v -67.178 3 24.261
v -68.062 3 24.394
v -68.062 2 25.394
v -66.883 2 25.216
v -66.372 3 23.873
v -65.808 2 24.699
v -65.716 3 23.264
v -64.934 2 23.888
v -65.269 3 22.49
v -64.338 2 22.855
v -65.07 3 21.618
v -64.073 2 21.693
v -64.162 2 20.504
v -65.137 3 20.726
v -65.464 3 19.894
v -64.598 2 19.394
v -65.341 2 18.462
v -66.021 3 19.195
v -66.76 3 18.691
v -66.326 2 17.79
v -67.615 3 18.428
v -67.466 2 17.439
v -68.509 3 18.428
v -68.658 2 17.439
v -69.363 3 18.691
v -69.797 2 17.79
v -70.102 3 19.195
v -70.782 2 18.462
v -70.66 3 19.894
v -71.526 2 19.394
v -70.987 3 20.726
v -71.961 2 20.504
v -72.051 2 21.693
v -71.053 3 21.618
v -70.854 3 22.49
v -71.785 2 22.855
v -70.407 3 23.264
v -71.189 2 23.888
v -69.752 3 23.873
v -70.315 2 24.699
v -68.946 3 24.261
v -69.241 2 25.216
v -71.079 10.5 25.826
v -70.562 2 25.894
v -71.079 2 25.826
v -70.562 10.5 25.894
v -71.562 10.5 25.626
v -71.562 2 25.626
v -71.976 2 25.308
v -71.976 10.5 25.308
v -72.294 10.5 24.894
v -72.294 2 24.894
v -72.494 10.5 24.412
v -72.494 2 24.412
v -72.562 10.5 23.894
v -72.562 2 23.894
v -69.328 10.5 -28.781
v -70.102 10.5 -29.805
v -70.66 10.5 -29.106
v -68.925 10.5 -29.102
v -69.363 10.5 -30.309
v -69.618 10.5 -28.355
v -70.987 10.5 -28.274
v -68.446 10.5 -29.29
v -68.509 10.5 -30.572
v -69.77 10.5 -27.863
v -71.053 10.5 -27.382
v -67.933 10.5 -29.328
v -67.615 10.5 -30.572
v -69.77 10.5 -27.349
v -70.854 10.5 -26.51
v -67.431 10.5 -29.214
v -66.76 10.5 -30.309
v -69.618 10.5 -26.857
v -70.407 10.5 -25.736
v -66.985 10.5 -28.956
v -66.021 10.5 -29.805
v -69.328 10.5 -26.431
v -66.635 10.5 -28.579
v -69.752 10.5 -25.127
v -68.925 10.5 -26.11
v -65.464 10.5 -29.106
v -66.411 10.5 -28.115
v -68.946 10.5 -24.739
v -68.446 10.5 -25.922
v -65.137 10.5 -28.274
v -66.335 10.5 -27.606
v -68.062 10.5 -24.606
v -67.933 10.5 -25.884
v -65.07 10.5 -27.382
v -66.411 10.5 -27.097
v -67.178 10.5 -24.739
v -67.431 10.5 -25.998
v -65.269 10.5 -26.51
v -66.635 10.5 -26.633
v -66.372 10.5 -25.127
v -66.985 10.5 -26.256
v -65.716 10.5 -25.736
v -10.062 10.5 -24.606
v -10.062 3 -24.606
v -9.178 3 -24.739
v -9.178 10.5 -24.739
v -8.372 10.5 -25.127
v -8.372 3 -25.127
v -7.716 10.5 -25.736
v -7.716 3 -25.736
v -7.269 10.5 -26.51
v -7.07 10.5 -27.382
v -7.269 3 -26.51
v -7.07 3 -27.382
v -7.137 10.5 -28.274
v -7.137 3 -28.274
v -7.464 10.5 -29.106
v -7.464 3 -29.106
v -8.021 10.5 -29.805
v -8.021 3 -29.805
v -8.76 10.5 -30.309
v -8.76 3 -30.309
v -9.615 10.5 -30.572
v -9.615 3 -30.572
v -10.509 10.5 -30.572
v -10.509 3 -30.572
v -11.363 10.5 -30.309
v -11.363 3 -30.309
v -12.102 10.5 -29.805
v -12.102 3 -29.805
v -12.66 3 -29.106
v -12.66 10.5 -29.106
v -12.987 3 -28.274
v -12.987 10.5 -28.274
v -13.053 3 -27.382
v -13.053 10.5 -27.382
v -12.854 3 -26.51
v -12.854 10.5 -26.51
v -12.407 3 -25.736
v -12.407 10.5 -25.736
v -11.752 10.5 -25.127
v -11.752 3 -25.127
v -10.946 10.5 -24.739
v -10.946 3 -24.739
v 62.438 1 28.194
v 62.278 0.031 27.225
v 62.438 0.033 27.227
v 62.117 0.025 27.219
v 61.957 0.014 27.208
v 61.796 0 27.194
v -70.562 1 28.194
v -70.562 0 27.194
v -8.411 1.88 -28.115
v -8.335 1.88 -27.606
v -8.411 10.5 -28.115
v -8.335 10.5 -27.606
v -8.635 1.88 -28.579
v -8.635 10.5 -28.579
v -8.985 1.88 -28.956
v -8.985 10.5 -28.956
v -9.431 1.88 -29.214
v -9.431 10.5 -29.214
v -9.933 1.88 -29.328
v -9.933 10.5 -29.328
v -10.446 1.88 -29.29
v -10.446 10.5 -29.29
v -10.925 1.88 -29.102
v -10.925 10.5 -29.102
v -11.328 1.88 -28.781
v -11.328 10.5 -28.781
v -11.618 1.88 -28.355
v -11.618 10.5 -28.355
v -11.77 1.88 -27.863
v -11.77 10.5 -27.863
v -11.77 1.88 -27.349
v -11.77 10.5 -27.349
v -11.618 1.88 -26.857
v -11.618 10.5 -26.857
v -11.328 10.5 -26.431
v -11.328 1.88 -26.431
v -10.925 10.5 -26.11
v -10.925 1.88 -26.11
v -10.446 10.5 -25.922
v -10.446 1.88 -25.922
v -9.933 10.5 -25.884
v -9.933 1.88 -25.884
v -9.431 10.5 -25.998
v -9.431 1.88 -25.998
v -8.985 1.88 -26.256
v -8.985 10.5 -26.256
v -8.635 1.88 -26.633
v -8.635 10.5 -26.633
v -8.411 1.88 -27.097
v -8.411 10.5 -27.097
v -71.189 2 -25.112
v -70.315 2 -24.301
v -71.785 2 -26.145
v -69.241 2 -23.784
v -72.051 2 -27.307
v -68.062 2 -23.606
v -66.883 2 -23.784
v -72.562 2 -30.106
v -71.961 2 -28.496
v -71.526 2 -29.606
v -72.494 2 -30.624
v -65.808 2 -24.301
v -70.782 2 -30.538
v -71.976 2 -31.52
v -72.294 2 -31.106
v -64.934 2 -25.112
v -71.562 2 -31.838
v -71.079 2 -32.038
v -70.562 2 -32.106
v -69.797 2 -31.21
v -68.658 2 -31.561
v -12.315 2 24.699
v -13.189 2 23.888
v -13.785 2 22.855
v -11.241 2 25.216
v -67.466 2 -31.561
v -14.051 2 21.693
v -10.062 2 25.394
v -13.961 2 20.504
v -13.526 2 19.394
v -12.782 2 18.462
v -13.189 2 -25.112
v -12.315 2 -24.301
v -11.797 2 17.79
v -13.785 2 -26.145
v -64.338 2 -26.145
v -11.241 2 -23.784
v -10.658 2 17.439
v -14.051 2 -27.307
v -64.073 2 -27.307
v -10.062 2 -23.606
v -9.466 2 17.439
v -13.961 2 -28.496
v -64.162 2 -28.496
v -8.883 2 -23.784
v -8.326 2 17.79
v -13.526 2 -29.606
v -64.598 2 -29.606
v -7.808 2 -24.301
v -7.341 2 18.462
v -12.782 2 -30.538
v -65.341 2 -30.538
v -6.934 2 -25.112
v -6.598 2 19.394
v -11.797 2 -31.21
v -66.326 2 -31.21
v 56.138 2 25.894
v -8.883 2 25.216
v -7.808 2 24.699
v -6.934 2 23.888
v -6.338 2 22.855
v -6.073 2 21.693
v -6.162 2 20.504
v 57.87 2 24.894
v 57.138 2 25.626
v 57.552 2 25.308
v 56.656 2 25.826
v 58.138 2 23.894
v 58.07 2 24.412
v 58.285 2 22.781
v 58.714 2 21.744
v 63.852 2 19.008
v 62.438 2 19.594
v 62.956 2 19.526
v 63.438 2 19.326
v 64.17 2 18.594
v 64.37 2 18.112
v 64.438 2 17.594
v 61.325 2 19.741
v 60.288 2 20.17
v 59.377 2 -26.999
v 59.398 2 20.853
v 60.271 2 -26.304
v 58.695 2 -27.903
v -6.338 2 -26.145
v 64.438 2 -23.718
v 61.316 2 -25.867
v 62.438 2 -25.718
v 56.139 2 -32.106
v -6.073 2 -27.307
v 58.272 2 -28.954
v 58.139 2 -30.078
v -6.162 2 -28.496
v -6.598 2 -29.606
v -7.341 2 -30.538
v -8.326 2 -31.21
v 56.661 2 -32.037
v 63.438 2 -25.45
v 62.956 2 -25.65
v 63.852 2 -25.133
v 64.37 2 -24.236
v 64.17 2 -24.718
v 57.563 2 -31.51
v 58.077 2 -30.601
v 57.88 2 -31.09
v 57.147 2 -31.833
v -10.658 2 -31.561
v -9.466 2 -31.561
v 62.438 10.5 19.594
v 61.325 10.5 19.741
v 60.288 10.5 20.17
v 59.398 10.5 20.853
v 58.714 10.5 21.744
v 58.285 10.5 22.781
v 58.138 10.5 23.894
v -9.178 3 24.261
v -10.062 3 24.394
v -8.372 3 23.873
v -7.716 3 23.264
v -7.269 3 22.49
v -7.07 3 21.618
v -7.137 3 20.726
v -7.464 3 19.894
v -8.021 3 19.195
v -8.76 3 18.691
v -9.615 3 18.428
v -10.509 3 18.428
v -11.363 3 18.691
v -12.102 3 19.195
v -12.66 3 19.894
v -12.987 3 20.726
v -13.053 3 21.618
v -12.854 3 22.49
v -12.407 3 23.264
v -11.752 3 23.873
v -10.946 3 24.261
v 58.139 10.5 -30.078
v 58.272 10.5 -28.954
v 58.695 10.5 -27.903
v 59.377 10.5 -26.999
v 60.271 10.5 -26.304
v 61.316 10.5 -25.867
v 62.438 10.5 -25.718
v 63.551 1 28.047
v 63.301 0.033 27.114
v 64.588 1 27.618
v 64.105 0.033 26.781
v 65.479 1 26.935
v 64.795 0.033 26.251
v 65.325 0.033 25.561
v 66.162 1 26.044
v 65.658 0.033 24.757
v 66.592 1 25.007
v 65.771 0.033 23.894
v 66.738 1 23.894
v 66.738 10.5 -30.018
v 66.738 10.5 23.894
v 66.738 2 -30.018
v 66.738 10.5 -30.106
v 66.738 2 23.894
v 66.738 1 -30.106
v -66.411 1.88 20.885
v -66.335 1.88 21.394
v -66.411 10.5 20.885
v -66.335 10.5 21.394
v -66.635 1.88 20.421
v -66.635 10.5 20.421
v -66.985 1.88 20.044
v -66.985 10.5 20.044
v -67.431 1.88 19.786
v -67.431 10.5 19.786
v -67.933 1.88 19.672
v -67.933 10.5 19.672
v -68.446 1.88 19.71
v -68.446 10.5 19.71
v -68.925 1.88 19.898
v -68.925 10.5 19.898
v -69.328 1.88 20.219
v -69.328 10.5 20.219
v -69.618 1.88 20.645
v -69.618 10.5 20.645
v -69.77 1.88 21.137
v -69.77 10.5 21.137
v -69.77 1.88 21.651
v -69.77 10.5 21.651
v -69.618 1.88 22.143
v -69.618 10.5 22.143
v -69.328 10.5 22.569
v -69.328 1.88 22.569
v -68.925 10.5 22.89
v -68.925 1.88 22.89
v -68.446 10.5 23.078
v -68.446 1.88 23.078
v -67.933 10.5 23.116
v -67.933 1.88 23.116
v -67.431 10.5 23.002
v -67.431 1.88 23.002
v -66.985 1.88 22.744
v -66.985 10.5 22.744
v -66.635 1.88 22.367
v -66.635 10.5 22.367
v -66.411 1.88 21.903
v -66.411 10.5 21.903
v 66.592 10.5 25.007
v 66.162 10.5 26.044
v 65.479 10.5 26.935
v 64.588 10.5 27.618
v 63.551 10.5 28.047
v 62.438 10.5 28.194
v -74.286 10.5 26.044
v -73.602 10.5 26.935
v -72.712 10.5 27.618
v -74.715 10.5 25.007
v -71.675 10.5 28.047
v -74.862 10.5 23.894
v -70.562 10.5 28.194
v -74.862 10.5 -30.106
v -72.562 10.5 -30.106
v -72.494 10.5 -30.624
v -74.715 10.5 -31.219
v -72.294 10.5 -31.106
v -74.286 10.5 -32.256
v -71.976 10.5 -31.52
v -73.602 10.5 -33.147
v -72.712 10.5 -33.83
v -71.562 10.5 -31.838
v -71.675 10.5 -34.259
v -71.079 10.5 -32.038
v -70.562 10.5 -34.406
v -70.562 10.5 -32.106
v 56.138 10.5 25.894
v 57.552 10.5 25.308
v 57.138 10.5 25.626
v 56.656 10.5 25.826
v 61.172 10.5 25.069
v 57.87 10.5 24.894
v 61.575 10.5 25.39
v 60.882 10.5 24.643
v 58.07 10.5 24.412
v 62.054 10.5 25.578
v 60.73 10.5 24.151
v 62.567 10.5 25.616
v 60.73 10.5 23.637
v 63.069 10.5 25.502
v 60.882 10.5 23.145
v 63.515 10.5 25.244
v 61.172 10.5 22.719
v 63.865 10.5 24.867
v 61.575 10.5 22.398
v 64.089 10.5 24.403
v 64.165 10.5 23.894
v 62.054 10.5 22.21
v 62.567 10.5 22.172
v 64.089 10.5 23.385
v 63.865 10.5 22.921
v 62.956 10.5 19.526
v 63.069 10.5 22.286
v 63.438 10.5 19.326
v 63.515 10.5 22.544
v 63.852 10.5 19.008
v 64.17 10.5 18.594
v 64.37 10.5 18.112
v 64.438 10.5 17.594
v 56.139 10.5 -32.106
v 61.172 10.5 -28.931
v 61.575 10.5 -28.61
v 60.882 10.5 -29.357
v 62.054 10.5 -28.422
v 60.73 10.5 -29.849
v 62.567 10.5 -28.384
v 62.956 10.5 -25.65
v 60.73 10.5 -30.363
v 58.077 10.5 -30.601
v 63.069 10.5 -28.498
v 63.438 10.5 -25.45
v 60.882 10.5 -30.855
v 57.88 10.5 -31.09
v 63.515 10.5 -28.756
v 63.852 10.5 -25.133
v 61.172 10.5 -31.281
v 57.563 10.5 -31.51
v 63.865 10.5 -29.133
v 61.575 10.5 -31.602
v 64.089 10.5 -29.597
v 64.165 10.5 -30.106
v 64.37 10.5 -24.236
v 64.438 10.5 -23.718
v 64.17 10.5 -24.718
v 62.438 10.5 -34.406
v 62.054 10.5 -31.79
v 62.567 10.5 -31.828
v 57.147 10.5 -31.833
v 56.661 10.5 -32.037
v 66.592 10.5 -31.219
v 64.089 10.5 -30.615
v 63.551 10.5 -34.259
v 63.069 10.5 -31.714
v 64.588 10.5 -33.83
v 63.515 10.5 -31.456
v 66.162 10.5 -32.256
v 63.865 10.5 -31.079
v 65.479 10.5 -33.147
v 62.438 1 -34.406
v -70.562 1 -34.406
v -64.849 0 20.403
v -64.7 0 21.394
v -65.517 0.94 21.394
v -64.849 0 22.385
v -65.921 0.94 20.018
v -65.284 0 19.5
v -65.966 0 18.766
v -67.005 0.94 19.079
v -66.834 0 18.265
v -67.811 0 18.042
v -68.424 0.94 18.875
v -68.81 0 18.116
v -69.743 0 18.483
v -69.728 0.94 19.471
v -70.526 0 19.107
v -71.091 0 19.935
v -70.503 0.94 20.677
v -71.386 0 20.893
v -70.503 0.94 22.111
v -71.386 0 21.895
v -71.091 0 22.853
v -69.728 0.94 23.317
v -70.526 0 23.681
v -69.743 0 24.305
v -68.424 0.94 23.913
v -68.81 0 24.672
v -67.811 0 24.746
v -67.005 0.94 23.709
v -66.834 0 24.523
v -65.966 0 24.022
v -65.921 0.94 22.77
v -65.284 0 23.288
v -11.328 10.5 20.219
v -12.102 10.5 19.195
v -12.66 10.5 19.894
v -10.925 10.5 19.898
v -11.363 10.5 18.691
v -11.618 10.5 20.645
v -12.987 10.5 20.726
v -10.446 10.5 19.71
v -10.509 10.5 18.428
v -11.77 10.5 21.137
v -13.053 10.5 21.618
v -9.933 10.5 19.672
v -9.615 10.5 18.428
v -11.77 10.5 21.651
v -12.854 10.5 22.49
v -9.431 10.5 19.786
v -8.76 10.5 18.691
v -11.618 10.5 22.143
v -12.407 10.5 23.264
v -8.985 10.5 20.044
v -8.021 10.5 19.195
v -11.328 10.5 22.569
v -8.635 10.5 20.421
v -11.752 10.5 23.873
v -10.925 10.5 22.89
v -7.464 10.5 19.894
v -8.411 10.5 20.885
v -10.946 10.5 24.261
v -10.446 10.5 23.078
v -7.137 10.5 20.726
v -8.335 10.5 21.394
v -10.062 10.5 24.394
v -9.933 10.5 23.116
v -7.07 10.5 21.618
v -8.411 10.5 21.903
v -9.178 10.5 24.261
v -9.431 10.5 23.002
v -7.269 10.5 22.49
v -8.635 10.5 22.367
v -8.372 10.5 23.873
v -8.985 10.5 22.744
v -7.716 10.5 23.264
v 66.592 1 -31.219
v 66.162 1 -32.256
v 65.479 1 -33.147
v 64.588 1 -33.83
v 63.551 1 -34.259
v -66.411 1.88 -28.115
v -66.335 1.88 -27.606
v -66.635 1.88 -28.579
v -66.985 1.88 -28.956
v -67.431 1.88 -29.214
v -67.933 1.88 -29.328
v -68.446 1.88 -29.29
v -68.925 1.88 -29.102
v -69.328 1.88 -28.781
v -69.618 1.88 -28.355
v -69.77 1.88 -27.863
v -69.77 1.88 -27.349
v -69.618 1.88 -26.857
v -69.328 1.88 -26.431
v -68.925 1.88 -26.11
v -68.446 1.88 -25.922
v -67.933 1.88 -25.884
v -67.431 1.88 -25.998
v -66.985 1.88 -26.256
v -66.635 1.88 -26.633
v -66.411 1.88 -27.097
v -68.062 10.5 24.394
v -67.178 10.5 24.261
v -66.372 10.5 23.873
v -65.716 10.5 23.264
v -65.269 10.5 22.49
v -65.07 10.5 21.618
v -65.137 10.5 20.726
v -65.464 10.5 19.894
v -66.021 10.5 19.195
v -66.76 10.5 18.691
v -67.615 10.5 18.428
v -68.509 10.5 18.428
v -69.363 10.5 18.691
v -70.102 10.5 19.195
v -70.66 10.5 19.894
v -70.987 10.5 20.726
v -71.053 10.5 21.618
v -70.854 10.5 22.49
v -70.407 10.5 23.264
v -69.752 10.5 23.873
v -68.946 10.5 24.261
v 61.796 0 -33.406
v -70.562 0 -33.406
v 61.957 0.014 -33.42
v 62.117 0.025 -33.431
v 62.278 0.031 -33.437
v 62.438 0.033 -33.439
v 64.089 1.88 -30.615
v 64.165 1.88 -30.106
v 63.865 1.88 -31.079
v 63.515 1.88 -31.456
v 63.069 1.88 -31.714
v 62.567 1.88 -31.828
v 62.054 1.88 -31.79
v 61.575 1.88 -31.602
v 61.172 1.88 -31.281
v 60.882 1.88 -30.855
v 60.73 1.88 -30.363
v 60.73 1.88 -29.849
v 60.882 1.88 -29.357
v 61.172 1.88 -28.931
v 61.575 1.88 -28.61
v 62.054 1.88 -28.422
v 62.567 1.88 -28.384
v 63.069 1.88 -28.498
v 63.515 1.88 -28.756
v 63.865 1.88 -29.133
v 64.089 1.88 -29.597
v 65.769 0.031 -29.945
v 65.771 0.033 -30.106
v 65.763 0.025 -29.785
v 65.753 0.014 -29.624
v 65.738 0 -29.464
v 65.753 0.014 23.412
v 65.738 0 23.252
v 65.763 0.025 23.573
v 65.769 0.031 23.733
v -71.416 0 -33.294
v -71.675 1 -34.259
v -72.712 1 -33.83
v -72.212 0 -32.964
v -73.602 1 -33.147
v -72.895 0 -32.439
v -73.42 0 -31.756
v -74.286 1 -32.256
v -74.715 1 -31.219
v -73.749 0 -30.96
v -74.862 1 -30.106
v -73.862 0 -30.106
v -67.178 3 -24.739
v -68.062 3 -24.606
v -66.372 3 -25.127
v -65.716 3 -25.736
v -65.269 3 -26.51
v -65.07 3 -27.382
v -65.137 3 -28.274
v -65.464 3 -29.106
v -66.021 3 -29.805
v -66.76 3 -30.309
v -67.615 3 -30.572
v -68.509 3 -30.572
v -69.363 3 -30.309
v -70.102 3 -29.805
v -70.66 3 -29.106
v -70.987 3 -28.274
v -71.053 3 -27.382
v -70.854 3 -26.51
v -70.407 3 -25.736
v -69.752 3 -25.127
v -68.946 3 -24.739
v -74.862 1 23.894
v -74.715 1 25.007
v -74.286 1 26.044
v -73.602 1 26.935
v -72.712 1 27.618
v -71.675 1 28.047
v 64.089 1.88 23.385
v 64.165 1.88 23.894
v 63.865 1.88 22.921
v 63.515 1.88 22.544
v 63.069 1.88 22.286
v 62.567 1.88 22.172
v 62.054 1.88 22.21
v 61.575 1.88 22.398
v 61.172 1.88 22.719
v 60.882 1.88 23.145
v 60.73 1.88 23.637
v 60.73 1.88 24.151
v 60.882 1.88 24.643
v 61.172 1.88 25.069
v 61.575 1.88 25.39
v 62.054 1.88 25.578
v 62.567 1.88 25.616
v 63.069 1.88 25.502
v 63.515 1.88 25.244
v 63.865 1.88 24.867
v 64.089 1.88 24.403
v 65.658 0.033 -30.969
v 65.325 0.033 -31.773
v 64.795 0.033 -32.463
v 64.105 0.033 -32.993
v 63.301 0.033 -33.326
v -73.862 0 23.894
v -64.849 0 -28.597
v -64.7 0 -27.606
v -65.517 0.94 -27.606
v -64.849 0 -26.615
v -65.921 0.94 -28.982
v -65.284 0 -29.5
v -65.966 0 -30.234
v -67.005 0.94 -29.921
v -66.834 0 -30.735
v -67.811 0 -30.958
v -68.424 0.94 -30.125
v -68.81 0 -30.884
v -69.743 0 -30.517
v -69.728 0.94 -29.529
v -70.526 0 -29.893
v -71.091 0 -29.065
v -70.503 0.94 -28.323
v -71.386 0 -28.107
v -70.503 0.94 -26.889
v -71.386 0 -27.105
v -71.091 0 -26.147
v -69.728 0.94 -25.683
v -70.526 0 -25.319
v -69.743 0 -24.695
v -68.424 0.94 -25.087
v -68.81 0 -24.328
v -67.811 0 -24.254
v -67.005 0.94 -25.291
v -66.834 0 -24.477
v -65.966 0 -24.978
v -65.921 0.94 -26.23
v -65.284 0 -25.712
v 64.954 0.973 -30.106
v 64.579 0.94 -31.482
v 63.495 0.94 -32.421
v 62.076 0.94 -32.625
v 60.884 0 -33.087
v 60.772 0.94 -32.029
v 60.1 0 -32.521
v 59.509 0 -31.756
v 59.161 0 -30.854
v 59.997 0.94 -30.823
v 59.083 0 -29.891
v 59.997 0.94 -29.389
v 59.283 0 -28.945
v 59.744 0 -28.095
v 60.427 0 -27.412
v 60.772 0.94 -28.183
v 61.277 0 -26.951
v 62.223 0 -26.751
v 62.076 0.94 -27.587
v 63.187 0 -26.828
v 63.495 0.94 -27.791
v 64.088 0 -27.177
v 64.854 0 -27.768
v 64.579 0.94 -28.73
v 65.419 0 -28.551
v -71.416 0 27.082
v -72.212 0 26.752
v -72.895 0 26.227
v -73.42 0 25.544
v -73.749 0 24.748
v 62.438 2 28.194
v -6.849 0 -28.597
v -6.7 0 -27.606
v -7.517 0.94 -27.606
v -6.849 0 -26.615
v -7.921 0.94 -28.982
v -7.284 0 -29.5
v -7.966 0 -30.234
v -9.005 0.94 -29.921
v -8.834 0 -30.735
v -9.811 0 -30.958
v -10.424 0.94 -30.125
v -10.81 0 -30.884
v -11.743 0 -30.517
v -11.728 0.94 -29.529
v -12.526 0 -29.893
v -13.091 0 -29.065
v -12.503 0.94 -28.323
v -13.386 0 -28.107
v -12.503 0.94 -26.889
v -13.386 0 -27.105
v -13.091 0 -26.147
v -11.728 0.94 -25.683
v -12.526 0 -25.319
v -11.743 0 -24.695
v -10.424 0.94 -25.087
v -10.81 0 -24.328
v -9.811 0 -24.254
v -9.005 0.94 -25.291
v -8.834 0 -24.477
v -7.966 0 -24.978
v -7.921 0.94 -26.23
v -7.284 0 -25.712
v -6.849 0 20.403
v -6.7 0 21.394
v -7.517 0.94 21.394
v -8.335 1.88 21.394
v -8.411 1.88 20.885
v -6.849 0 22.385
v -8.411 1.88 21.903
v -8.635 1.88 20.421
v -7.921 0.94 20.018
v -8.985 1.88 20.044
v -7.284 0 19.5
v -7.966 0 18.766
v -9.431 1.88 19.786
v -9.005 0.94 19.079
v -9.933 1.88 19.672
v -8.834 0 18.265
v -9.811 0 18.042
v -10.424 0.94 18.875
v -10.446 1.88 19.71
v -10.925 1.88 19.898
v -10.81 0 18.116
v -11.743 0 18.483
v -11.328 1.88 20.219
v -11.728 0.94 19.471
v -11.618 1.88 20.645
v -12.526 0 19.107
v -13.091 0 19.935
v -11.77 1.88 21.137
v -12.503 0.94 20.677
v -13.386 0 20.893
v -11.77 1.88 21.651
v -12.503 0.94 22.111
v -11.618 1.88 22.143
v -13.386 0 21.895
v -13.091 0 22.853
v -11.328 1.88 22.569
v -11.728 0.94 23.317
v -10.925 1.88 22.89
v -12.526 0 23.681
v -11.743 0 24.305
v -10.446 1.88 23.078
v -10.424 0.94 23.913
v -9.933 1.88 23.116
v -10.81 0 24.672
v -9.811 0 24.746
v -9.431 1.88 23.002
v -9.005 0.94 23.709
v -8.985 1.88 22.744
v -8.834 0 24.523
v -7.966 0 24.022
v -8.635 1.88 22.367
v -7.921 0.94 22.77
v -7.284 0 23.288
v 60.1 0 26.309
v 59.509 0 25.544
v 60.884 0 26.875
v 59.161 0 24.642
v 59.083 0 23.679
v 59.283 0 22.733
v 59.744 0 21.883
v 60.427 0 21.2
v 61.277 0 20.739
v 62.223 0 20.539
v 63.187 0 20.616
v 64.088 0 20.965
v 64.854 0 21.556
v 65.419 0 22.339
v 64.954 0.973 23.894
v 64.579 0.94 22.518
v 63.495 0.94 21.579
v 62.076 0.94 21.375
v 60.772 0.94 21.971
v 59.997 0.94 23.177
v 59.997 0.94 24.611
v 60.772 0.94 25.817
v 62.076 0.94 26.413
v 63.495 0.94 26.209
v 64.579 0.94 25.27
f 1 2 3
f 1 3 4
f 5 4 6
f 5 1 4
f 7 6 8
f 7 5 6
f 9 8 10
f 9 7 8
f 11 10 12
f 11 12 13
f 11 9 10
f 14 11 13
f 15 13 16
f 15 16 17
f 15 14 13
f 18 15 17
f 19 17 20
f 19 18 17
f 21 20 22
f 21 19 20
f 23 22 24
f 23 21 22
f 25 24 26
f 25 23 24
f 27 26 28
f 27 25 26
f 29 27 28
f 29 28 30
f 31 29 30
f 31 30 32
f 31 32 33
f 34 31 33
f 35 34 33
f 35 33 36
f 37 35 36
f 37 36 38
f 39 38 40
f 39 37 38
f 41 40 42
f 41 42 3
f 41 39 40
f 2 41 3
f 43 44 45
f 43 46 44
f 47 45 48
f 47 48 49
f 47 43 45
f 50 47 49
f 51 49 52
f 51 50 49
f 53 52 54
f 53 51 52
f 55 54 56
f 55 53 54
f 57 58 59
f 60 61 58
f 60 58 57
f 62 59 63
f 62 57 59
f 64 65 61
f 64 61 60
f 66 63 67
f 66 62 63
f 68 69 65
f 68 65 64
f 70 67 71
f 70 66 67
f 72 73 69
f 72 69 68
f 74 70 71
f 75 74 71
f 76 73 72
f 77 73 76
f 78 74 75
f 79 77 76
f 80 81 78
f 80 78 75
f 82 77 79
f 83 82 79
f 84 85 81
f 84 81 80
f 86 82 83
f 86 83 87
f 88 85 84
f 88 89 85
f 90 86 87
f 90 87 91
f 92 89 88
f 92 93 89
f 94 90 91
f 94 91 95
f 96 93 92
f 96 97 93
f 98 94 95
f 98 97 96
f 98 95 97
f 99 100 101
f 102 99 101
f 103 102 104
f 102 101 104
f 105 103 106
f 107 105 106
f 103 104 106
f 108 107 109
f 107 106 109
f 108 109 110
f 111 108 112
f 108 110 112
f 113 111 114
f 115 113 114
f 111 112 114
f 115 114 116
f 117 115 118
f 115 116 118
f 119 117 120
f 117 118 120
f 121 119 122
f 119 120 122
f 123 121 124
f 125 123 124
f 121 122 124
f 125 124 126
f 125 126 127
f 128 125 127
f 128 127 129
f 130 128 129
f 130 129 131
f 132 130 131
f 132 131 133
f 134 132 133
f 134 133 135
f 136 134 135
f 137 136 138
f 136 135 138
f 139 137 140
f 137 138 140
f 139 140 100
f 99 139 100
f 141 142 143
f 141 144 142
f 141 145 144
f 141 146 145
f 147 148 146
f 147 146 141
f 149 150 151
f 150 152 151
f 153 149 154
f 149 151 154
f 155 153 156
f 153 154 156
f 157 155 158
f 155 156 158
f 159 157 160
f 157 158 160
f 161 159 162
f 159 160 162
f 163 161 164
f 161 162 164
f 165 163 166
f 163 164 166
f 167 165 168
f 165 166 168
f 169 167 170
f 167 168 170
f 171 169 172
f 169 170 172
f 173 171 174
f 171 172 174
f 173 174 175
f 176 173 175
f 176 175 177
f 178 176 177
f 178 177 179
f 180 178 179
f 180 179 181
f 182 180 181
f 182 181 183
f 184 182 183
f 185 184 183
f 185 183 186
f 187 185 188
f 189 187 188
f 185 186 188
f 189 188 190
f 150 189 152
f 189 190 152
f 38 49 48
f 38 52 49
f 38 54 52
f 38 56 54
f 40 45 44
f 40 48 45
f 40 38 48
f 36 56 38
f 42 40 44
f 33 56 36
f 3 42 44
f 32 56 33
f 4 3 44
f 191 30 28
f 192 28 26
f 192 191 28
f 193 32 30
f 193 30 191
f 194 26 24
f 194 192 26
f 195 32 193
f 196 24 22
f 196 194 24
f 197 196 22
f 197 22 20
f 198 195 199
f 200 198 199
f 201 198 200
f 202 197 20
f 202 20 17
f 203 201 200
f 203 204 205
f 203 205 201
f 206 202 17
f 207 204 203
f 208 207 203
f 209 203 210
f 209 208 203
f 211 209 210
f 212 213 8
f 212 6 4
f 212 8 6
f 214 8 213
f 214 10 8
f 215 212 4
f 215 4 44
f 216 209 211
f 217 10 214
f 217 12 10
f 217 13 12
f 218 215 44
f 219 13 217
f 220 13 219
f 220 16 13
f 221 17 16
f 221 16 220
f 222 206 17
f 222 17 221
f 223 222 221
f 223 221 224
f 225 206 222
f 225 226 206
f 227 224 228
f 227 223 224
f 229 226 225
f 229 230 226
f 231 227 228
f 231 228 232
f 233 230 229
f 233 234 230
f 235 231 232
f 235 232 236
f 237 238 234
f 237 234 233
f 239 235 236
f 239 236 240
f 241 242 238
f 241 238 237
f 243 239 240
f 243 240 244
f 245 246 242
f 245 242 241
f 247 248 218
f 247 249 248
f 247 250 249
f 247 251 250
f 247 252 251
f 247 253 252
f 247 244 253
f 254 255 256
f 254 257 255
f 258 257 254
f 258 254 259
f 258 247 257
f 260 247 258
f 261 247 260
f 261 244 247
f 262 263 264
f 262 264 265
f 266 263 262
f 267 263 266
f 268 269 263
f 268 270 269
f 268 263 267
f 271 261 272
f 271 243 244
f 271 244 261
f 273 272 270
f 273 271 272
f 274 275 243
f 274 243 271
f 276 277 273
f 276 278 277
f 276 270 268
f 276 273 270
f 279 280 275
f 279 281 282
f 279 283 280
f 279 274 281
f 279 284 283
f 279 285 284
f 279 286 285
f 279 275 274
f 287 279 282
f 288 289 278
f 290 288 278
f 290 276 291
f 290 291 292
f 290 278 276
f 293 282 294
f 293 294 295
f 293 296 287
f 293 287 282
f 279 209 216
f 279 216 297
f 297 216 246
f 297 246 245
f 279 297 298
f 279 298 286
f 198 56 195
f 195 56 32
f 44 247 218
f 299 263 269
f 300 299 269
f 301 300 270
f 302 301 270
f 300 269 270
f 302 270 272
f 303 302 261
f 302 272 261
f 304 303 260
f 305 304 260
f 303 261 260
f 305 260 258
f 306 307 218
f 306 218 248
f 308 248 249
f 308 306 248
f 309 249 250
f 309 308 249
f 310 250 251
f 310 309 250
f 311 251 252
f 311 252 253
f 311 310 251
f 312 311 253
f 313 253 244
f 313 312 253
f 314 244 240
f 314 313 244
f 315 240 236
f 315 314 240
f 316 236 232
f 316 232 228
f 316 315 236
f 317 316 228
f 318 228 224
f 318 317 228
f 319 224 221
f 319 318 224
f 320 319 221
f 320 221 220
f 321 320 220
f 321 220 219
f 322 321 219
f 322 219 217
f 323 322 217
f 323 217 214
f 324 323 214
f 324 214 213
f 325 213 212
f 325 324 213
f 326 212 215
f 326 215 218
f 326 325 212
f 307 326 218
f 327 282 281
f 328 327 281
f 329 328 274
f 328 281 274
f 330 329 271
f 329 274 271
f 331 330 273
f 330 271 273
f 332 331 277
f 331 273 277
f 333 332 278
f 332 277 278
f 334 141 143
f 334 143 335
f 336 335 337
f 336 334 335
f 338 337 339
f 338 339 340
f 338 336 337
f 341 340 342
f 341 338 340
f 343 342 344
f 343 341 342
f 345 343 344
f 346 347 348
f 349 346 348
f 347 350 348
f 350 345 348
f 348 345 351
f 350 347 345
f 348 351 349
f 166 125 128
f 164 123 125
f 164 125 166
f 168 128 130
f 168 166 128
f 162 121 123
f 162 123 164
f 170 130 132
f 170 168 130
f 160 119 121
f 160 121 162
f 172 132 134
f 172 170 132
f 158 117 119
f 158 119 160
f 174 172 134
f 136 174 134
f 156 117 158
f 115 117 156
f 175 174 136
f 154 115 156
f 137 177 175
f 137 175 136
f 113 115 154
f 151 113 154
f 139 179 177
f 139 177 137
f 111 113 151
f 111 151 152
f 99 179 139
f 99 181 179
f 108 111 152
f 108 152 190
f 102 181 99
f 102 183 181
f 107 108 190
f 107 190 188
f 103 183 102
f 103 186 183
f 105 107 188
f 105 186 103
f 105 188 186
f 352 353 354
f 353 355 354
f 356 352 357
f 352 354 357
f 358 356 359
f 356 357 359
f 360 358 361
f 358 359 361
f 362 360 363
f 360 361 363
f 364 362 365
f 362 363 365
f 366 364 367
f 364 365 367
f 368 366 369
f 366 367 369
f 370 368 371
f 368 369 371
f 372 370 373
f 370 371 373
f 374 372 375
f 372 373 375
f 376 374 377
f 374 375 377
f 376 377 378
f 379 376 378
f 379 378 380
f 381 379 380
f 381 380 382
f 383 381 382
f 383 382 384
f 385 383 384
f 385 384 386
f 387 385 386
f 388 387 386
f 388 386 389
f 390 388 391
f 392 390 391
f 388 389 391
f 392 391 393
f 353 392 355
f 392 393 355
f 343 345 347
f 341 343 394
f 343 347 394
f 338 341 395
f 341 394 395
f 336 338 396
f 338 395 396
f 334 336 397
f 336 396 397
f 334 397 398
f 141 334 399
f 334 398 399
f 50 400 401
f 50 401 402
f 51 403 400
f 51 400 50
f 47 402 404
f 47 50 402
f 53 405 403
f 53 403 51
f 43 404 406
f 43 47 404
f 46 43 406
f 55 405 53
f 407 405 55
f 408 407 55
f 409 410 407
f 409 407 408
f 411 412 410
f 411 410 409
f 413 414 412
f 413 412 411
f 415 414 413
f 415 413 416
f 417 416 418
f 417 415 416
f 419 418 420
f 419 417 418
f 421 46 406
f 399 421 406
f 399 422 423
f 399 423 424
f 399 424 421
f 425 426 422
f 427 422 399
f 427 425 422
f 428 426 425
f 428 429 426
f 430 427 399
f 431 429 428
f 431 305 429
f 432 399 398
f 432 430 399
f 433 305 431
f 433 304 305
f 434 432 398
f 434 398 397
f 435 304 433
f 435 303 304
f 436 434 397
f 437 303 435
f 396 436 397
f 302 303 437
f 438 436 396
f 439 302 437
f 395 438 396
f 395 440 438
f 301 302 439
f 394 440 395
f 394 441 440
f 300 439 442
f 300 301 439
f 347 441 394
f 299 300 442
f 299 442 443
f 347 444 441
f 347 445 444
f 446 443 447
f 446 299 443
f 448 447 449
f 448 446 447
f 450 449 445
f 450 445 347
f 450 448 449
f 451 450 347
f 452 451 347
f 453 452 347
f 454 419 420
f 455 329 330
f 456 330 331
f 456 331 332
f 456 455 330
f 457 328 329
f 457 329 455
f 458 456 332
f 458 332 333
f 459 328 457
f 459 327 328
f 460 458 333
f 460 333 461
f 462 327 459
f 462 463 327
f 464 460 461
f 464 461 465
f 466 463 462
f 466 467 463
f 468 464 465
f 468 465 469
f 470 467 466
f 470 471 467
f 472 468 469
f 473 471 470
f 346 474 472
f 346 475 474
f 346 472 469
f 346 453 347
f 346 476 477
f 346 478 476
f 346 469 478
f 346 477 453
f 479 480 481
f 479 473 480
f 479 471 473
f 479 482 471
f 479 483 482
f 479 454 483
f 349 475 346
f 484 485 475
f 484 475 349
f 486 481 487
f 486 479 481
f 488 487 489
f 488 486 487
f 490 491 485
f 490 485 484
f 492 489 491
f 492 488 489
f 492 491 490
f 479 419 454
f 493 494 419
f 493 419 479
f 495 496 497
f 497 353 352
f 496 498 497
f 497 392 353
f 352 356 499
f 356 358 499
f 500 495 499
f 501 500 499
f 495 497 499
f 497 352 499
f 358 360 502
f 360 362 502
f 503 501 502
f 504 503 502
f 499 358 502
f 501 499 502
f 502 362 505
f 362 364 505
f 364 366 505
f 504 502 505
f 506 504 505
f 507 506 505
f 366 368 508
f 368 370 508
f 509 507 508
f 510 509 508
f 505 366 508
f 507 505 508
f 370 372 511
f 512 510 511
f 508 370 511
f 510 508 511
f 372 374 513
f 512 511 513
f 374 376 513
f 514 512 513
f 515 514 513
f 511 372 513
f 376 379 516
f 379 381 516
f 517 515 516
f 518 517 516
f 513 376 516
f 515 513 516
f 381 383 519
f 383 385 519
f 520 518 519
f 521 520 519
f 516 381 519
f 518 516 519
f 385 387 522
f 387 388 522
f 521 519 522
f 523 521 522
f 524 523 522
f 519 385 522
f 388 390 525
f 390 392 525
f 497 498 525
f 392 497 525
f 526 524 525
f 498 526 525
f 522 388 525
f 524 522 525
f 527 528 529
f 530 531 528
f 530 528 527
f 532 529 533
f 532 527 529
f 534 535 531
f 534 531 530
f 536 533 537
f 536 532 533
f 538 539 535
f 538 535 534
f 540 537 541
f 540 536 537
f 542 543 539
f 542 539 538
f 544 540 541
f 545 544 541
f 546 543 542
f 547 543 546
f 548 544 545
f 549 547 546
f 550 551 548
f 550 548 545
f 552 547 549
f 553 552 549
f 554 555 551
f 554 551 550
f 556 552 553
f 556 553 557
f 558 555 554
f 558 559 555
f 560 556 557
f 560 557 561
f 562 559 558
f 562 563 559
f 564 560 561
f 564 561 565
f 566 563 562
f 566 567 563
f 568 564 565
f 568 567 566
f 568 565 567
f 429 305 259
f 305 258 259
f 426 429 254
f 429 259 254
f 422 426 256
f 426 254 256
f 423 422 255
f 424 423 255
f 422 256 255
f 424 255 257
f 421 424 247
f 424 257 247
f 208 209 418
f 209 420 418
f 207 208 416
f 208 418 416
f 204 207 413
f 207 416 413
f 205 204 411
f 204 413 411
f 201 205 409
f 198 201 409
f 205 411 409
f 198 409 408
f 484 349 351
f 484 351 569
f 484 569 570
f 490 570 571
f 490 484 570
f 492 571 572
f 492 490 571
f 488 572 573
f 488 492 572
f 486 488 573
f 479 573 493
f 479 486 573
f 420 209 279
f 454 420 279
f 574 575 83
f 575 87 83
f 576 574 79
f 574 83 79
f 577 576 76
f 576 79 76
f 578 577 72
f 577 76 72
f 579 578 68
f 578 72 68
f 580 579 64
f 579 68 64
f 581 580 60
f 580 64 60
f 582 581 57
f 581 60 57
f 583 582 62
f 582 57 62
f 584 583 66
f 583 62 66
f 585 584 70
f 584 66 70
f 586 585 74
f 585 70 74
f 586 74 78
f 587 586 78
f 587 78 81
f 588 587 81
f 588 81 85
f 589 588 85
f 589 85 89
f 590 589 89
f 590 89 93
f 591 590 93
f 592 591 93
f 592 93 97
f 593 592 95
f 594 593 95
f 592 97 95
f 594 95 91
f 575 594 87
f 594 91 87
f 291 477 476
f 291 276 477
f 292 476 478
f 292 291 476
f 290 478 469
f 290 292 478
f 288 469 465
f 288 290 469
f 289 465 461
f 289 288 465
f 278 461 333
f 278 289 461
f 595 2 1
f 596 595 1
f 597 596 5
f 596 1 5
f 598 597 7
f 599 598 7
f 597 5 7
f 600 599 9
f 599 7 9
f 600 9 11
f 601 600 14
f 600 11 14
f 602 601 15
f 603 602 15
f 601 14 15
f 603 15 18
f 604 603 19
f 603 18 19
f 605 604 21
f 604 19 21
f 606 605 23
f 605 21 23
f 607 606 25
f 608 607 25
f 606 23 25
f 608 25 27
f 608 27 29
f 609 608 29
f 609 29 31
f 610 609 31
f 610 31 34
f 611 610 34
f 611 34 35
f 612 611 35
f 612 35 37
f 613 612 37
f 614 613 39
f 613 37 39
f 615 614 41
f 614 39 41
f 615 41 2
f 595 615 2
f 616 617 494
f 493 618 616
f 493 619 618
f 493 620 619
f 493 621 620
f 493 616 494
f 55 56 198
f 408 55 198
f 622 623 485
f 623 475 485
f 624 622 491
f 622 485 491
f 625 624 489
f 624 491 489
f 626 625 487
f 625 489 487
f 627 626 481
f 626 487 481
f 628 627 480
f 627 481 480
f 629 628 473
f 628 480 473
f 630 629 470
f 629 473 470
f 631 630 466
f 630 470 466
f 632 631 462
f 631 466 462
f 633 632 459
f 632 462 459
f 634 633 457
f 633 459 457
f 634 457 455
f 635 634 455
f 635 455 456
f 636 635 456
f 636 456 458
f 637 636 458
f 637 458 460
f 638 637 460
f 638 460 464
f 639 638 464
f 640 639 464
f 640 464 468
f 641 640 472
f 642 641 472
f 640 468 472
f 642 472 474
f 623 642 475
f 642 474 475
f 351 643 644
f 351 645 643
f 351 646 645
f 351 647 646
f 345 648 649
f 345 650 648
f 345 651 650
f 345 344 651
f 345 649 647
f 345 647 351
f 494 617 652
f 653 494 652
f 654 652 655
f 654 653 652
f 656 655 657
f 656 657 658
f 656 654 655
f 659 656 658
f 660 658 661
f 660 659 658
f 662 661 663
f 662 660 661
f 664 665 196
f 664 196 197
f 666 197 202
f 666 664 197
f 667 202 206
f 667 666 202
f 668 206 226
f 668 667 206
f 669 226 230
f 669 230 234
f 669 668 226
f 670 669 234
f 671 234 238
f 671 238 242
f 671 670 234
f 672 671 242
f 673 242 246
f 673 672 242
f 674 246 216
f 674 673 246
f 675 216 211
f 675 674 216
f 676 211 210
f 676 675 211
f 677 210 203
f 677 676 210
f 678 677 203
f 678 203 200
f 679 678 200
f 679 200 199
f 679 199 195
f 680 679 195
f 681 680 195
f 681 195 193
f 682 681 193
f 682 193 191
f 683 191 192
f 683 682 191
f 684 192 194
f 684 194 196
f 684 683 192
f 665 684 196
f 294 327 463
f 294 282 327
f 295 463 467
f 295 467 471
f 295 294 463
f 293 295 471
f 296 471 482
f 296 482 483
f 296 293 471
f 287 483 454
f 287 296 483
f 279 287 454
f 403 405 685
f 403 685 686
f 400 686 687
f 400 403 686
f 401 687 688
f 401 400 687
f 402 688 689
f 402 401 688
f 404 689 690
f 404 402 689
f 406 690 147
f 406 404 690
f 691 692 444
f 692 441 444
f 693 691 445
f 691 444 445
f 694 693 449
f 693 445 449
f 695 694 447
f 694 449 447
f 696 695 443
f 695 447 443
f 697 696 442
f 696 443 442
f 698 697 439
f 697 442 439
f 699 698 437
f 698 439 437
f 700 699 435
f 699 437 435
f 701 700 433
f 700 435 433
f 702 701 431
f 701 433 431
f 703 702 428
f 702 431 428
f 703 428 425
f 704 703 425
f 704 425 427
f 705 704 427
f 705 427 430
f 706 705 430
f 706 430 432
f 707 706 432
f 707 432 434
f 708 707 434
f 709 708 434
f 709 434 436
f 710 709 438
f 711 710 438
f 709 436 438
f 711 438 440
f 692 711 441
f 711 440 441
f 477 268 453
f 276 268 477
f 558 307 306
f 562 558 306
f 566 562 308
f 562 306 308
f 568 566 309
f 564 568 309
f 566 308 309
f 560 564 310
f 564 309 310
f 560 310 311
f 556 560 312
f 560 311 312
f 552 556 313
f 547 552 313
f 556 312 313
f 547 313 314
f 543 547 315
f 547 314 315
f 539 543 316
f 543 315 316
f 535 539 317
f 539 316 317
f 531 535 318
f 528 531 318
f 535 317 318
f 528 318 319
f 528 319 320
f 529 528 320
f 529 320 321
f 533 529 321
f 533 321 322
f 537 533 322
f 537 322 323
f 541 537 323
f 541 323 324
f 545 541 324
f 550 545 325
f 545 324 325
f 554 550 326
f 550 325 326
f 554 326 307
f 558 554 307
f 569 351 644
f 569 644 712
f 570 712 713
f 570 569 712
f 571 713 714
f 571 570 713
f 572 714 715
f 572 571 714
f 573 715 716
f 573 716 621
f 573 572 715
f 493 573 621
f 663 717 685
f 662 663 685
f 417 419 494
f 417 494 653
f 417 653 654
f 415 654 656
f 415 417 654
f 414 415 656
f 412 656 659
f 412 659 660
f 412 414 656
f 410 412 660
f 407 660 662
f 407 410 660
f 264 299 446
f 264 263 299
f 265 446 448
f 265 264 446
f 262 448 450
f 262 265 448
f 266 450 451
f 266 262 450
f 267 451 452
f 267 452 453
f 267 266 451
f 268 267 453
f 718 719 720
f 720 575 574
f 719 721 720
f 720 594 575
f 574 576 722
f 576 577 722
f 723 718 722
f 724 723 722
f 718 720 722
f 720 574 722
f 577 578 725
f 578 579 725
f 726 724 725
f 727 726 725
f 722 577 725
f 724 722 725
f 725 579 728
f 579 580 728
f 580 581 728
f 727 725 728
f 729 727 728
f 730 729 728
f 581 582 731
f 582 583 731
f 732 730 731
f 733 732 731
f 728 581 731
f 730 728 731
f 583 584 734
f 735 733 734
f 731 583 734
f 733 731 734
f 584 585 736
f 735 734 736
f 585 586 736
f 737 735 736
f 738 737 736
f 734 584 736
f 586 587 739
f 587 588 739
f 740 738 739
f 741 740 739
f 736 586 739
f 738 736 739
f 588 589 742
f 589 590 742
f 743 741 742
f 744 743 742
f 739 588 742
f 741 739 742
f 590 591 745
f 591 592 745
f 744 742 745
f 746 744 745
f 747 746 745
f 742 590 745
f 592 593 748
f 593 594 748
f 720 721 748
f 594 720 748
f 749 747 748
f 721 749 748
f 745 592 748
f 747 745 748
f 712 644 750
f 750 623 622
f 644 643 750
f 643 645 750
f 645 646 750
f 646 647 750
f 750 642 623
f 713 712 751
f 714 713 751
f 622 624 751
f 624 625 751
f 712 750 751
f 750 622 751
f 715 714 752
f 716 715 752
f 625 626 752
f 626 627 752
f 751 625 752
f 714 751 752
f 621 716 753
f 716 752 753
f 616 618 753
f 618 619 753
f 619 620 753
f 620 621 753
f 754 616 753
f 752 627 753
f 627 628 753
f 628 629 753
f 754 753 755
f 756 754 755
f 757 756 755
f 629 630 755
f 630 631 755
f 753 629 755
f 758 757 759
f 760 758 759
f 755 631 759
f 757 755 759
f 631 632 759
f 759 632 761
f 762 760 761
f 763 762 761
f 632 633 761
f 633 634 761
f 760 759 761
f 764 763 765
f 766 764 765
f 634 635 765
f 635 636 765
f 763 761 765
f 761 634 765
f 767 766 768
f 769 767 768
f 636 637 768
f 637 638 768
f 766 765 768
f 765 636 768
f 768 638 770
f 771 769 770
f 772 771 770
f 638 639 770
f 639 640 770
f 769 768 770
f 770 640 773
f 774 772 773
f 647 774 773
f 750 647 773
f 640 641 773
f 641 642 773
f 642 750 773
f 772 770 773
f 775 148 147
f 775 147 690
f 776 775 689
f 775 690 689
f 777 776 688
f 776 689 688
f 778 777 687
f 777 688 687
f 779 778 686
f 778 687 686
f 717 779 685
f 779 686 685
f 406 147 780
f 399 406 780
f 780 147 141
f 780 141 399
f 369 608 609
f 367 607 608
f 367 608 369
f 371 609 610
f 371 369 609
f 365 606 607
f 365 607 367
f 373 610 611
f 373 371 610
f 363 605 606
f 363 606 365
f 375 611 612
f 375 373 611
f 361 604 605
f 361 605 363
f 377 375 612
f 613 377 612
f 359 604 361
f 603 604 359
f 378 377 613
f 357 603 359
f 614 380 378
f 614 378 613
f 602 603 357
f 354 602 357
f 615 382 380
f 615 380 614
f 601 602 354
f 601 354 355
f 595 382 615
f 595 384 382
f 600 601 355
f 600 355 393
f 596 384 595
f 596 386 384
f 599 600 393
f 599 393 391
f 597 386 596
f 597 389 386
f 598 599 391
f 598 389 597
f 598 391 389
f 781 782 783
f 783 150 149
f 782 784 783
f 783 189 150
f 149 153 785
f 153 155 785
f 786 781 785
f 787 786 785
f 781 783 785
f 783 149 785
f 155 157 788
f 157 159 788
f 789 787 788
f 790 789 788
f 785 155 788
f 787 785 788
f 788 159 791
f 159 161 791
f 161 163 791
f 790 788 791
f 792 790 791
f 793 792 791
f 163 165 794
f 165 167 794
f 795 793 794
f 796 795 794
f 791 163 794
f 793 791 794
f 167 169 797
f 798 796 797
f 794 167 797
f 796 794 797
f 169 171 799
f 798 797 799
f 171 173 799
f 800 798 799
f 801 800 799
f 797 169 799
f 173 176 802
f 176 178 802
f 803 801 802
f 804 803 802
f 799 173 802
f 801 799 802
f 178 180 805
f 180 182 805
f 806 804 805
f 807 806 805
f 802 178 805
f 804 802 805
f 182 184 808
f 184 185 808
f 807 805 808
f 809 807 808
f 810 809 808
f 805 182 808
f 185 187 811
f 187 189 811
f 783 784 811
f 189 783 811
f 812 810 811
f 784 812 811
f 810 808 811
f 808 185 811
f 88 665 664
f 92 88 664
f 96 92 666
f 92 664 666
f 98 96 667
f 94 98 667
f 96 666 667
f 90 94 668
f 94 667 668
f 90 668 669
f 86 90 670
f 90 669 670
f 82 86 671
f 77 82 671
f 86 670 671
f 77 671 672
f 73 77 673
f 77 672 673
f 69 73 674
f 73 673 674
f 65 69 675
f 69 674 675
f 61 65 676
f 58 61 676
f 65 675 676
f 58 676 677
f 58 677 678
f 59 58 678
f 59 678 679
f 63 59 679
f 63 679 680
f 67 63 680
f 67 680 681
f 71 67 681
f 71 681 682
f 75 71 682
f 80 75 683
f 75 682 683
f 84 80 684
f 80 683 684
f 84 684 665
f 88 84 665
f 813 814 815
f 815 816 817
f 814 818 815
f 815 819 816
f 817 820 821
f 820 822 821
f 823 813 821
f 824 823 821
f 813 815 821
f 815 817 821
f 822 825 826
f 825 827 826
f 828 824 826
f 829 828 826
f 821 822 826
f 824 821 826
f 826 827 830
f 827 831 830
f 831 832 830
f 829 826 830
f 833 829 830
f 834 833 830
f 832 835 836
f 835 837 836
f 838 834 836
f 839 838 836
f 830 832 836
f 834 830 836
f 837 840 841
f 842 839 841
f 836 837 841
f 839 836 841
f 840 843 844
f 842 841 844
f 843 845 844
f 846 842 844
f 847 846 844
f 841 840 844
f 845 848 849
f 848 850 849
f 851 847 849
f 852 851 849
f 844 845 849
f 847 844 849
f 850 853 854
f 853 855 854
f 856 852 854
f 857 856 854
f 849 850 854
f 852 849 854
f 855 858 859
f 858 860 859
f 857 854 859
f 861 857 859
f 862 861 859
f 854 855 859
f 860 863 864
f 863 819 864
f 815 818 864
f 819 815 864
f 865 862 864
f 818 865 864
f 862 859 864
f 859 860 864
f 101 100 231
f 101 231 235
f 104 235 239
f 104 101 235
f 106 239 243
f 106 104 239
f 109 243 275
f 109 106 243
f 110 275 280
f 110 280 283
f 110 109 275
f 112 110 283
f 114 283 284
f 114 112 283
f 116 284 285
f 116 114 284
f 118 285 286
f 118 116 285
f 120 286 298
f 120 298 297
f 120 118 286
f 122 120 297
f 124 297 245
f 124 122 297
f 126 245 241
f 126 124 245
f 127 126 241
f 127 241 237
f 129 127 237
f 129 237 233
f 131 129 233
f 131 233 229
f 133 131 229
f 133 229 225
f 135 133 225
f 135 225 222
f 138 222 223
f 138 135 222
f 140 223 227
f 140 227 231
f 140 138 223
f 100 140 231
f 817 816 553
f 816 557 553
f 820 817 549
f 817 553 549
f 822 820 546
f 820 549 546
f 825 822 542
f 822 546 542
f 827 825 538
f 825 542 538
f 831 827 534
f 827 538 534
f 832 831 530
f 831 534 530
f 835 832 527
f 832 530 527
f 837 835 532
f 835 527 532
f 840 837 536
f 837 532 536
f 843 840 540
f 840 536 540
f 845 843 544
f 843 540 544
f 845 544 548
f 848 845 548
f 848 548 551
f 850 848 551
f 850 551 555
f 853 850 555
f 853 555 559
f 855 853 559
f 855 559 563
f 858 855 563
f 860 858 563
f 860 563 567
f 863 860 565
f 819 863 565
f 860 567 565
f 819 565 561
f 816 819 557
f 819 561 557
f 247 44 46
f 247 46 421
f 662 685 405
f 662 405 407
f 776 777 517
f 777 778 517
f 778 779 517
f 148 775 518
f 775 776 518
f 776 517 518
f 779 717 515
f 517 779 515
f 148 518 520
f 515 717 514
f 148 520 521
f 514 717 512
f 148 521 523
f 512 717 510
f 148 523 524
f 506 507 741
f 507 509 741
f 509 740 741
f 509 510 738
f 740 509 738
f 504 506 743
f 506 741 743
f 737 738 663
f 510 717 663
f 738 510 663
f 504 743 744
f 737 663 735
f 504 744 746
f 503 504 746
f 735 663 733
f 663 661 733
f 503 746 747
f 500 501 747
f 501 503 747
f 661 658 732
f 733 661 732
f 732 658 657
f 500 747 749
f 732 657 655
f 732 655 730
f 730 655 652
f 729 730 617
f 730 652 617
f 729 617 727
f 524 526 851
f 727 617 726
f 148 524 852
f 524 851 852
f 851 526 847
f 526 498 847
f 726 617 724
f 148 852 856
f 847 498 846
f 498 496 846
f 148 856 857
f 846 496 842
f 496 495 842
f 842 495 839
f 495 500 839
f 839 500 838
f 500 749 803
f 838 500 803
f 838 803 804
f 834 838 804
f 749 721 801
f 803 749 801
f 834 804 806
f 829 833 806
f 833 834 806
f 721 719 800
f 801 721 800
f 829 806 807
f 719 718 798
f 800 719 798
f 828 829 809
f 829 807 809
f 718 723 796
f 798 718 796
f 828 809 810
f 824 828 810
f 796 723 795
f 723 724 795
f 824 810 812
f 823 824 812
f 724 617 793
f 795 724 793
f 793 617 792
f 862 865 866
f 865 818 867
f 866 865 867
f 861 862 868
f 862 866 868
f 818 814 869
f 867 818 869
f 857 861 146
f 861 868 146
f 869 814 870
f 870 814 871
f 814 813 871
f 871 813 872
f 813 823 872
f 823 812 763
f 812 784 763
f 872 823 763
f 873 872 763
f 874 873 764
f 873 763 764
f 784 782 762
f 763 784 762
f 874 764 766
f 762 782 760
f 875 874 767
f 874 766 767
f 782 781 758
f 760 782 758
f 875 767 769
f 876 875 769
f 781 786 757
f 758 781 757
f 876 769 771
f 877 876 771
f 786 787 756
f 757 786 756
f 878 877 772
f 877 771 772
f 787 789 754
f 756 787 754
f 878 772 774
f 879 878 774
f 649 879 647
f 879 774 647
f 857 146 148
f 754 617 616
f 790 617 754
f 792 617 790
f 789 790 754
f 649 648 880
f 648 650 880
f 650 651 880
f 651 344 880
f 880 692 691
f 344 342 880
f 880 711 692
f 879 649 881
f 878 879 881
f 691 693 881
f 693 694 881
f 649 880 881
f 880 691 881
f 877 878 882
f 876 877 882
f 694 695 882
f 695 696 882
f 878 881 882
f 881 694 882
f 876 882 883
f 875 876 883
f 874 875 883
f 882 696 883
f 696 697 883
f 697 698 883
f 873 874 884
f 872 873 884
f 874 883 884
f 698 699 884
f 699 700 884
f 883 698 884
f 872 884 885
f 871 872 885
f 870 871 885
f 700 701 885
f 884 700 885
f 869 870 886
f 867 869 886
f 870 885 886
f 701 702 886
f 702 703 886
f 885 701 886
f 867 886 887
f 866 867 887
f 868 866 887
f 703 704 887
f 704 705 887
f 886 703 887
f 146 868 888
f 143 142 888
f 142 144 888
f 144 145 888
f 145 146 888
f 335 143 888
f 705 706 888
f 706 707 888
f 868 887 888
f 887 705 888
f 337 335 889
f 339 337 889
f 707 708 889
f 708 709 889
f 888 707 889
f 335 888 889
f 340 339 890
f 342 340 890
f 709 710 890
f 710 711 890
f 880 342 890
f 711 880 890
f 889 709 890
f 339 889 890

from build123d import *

# Parameters (mm, degrees)
SKETCH3_W                                         = 141.6
SKETCH3_H                                         = 62.6
SKETCH3_W_2                                       = 137
SKETCH3_H_2                                       = 58
BOSS_EXTRUDE1_DEPTH                               = 10.5
SKETCH5_W                                         = 137
SKETCH5_H                                         = 58
BOSS_EXTRUDE2_DEPTH                               = 2
SKETCH6_R                                         = 3
BOSS_EXTRUDE3_DEPTH                               = 8.5
FILLET6_R                                         = 2
FILLET8_R                                         = 2
CHAMFER1_SIZE                                     = 1
SKETCH24_R                                        = 4.3
BOSS_EXTRUDE7_DEPTH                               = 8.5
FILLET21_R                                        = 2
FILLET22_R                                        = 2
FILLET20_R                                        = 4.3
CSK_FOR_4_FLAT_HEAD_SOCKET_CAP_SCREW1_D           = 3.4544
CSK_FOR_4_FLAT_HEAD_SOCKET_CAP_SCREW1_DEPTH       = 14
CSK_FOR_4_FLAT_HEAD_SOCKET_CAP_SCREW1_CSINK_D     = 6.723761
CSK_FOR_4_FLAT_HEAD_SOCKET_CAP_SCREW1_CSINK_ANGLE = 82
CSK_FOR_4_FLAT_HEAD_SOCKET_CAP_SCREW1_TIP         = 1.037806461
CHAMFER7_SIZE                                     = 1


# Some blends are built 0.0001 mm under size
with BuildPart() as part:
    # Sketch3 → Boss-Extrude1 (new body)
    with BuildSketch(Plane(origin=(0, 0, 0), x_dir=(1, 0, 0), z_dir=(0, 1, 0))):
        with Locations((-4.061766162, 3.105993834)):
            Rectangle(SKETCH3_W, SKETCH3_H)
        with Locations((-4.061766162, 3.105993834)):
            Rectangle(SKETCH3_W_2, SKETCH3_H_2, mode=Mode.SUBTRACT)
    extrude(amount=BOSS_EXTRUDE1_DEPTH)

    # Sketch5 → Boss-Extrude2 (add)
    with BuildSketch(Plane(origin=(0, 0, 0), x_dir=(1, 0, 0), z_dir=(0, 1, 0))):
        with Locations((-4.061766162, 3.105993834)):
            Rectangle(SKETCH5_W, SKETCH5_H)
    extrude(amount=BOSS_EXTRUDE2_DEPTH)

    # Sketch6 → Boss-Extrude3 (add)
    with BuildSketch(Plane(origin=(0, 2, 0), x_dir=(1, 0, 0), z_dir=(0, 1, 0))):
        with Locations(Location((-68.061766162, 27.605993834, 0), (0, 0, 270))):
            Circle(SKETCH6_R)
        with Locations(Location((-68.061766162, -21.394006166, 0), (0, 0, 270))):
            Circle(SKETCH6_R)
        with Locations(Location((-10.061766162, -21.394006166, 0), (0, 0, 270))):
            Circle(SKETCH6_R)
        with Locations(Location((-10.061766162, 27.605993834, 0), (0, 0, 270))):
            Circle(SKETCH6_R)
    extrude(amount=BOSS_EXTRUDE3_DEPTH)

    # Fillet6
    fillet6_edges = [part.edges().sort_by_distance(p)[0] for p in [
        (64.438233838, 6.25, -32.105993834),
    ]]
    fillet(fillet6_edges, radius=FILLET6_R)

    # Fillet8
    fillet8_edges = [part.edges().sort_by_distance(p)[0] for p in [
        (-72.561766162, 6.25, -32.105993834),
        (-72.561766162, 6.25, 25.894006166),
    ]]
    fillet(fillet8_edges, radius=FILLET8_R)

    # Chamfer1
    chamfer1_edges = [part.edges().sort_by_distance(p)[0] for p in [
        (-68.061766162, 2, -30.605993834),
        (-68.061766162, 2, 18.394006166),
        (-10.061766162, 2, 18.394006166),
        (-10.061766162, 2, -30.605993834),
    ]]
    chamfer(chamfer1_edges, length=CHAMFER1_SIZE)

    # Sketch24 → Boss-Extrude7 (add)
    with BuildSketch(Plane(origin=(0, 2, 0), x_dir=(1, 0, 0), z_dir=(0, 1, 0))):
        with Locations((62.438233838, -23.894006166)):
            Circle(SKETCH24_R)
        with Locations((62.438233838, 30.01834388)):
            Circle(SKETCH24_R)
    extrude(amount=BOSS_EXTRUDE7_DEPTH)

    # Fillet21
    fillet21_edges = [part.edges().sort_by_distance(p)[0] for p in [
        (58.631660576, 6.25, 25.894006166),
    ]]
    fillet(fillet21_edges, radius=FILLET21_R)

    # Fillet22
    fillet22_edges = [part.edges().sort_by_distance(p)[0] for p in [
        (64.438233838, 6.25, -26.211770618),
        (58.679016144, 6.25, -32.105993834),
        (64.438233838, 6.25, 20.087432904),
    ]]
    fillet(fillet22_edges, radius=FILLET22_R)

    # Fillet20
    fillet20_edges = [part.edges().sort_by_distance(p)[0] for p in [
        (-74.861766162, 5.25, -34.405993834),
        (66.738233838, 5.25, -34.405993834),
        (66.738233838, 5.25, 28.194006166),
        (-74.861766162, 5.25, 28.194006166),
    ]]
    fillet(fillet20_edges, radius=FILLET20_R - 0.0001)  # a hair under: the kernel refuses the full size

    # CSK for #4 Flat Head Socket Cap Screw1
    with Locations(Plane(origin=(0, 0, 0), x_dir=(-1, 0, 0), z_dir=(0, -1, 0))):
        with Locations((68.061766162, 27.605993834), (68.061766162, -21.394006166), (-62.438233838, 30.105993834), (-62.438233838, -23.894006166), (10.061766162, -21.394006166), (10.061766162, 27.605993834)):
            CounterSinkHole(CSK_FOR_4_FLAT_HEAD_SOCKET_CAP_SCREW1_D / 2, CSK_FOR_4_FLAT_HEAD_SOCKET_CAP_SCREW1_CSINK_D / 2, depth=CSK_FOR_4_FLAT_HEAD_SOCKET_CAP_SCREW1_DEPTH, counter_sink_angle=CSK_FOR_4_FLAT_HEAD_SOCKET_CAP_SCREW1_CSINK_ANGLE)
            with Locations((0, 0, -(CSK_FOR_4_FLAT_HEAD_SOCKET_CAP_SCREW1_DEPTH + CSK_FOR_4_FLAT_HEAD_SOCKET_CAP_SCREW1_TIP / 2))):  # 118° drill point
                Cone(0, CSK_FOR_4_FLAT_HEAD_SOCKET_CAP_SCREW1_D / 2, CSK_FOR_4_FLAT_HEAD_SOCKET_CAP_SCREW1_TIP, mode=Mode.SUBTRACT)

    # Chamfer7
    # the kernel refuses this chamfer: 1 mm, written as the material it takes off along each edge
    with BuildSketch(Plane(origin=(62.438333838, 0, -34.405993834), x_dir=(0, -0.027495876610586292, 0.9996219169112968), z_dir=(-1, 0, 0)), Plane(origin=(-70.561866162, 0, 28.194006166), x_dir=(0, -0.02749587661058639, -0.9996219169112968), z_dir=(1, 0, 0))) as chamfer7_piece_1:
        Polygon((CHAMFER7_SIZE * 0.999621916911, CHAMFER7_SIZE * 0.0274958766106), (-CHAMFER7_SIZE * 0.0274958766106, CHAMFER7_SIZE * 0.999621916911), (0, 0), align=None)
    extrude(amount=133.0002, mode=Mode.SUBTRACT)
    with BuildSketch(Plane(origin=(-74.861766162, 0, -30.106093834), x_dir=(0.9996219169112968, -0.027495876610586483, 0), z_dir=(0, 0, 1)), Plane(origin=(66.738233838, 0, 23.894106166), x_dir=(-0.9996219169112968, -0.027495876610586483, 0), z_dir=(0, 0, -1))) as chamfer7_piece_2:
        Polygon((CHAMFER7_SIZE * 0.999621916911, CHAMFER7_SIZE * 0.0274958766106), (-CHAMFER7_SIZE * 0.0274958766106, CHAMFER7_SIZE * 0.999621916911), (0, 0), align=None)
    extrude(amount=54.0002, mode=Mode.SUBTRACT)
    with BuildSketch(Plane(origin=(62.438333838, 0, 23.894106166), x_dir=(0, 0, 1), z_dir=(-1, 0, 0))) as chamfer7_piece_3:
        Polygon((4.2999 - CHAMFER7_SIZE, 0), (4.2999, CHAMFER7_SIZE), (4.2999, 0), align=None)
    revolve(axis=Axis((62.438333838, 0, 23.894106166), (0, 1, 0)), revolution_arc=90, mode=Mode.SUBTRACT)
    with BuildSketch(Plane(origin=(-70.561866162, 0, 23.894106166), x_dir=(0, 0, 1), z_dir=(1, 0, 0))) as chamfer7_piece_4:
        Polygon((4.2999 - CHAMFER7_SIZE, 0), (4.2999, -CHAMFER7_SIZE), (4.2999, 0), align=None)
    revolve(axis=Axis((-70.561866162, 0, 23.894106166), (0, -1, 0)), revolution_arc=90, mode=Mode.SUBTRACT)
    with BuildSketch(Plane(origin=(-70.561866162, 0, -30.106093834), x_dir=(0, 0, -1), z_dir=(1, 0, 0))) as chamfer7_piece_5:
        Polygon((4.2999 - CHAMFER7_SIZE, 0), (4.2999, CHAMFER7_SIZE), (4.2999, 0), align=None)
    revolve(axis=Axis((-70.561866162, 0, -30.106093834), (0, 1, 0)), revolution_arc=90, mode=Mode.SUBTRACT)
    with BuildSketch(Plane(origin=(62.438333838, 0, -30.106093834), x_dir=(1, 0, 0), z_dir=(0, 0, 1))) as chamfer7_piece_6:
        Polygon((4.2999 - CHAMFER7_SIZE, 0), (4.2999, CHAMFER7_SIZE), (4.2999, 0), align=None)
    revolve(axis=Axis((62.438333838, 0, -30.106093834), (0, 1, 0)), revolution_arc=90, mode=Mode.SUBTRACT)


solid = part.part
